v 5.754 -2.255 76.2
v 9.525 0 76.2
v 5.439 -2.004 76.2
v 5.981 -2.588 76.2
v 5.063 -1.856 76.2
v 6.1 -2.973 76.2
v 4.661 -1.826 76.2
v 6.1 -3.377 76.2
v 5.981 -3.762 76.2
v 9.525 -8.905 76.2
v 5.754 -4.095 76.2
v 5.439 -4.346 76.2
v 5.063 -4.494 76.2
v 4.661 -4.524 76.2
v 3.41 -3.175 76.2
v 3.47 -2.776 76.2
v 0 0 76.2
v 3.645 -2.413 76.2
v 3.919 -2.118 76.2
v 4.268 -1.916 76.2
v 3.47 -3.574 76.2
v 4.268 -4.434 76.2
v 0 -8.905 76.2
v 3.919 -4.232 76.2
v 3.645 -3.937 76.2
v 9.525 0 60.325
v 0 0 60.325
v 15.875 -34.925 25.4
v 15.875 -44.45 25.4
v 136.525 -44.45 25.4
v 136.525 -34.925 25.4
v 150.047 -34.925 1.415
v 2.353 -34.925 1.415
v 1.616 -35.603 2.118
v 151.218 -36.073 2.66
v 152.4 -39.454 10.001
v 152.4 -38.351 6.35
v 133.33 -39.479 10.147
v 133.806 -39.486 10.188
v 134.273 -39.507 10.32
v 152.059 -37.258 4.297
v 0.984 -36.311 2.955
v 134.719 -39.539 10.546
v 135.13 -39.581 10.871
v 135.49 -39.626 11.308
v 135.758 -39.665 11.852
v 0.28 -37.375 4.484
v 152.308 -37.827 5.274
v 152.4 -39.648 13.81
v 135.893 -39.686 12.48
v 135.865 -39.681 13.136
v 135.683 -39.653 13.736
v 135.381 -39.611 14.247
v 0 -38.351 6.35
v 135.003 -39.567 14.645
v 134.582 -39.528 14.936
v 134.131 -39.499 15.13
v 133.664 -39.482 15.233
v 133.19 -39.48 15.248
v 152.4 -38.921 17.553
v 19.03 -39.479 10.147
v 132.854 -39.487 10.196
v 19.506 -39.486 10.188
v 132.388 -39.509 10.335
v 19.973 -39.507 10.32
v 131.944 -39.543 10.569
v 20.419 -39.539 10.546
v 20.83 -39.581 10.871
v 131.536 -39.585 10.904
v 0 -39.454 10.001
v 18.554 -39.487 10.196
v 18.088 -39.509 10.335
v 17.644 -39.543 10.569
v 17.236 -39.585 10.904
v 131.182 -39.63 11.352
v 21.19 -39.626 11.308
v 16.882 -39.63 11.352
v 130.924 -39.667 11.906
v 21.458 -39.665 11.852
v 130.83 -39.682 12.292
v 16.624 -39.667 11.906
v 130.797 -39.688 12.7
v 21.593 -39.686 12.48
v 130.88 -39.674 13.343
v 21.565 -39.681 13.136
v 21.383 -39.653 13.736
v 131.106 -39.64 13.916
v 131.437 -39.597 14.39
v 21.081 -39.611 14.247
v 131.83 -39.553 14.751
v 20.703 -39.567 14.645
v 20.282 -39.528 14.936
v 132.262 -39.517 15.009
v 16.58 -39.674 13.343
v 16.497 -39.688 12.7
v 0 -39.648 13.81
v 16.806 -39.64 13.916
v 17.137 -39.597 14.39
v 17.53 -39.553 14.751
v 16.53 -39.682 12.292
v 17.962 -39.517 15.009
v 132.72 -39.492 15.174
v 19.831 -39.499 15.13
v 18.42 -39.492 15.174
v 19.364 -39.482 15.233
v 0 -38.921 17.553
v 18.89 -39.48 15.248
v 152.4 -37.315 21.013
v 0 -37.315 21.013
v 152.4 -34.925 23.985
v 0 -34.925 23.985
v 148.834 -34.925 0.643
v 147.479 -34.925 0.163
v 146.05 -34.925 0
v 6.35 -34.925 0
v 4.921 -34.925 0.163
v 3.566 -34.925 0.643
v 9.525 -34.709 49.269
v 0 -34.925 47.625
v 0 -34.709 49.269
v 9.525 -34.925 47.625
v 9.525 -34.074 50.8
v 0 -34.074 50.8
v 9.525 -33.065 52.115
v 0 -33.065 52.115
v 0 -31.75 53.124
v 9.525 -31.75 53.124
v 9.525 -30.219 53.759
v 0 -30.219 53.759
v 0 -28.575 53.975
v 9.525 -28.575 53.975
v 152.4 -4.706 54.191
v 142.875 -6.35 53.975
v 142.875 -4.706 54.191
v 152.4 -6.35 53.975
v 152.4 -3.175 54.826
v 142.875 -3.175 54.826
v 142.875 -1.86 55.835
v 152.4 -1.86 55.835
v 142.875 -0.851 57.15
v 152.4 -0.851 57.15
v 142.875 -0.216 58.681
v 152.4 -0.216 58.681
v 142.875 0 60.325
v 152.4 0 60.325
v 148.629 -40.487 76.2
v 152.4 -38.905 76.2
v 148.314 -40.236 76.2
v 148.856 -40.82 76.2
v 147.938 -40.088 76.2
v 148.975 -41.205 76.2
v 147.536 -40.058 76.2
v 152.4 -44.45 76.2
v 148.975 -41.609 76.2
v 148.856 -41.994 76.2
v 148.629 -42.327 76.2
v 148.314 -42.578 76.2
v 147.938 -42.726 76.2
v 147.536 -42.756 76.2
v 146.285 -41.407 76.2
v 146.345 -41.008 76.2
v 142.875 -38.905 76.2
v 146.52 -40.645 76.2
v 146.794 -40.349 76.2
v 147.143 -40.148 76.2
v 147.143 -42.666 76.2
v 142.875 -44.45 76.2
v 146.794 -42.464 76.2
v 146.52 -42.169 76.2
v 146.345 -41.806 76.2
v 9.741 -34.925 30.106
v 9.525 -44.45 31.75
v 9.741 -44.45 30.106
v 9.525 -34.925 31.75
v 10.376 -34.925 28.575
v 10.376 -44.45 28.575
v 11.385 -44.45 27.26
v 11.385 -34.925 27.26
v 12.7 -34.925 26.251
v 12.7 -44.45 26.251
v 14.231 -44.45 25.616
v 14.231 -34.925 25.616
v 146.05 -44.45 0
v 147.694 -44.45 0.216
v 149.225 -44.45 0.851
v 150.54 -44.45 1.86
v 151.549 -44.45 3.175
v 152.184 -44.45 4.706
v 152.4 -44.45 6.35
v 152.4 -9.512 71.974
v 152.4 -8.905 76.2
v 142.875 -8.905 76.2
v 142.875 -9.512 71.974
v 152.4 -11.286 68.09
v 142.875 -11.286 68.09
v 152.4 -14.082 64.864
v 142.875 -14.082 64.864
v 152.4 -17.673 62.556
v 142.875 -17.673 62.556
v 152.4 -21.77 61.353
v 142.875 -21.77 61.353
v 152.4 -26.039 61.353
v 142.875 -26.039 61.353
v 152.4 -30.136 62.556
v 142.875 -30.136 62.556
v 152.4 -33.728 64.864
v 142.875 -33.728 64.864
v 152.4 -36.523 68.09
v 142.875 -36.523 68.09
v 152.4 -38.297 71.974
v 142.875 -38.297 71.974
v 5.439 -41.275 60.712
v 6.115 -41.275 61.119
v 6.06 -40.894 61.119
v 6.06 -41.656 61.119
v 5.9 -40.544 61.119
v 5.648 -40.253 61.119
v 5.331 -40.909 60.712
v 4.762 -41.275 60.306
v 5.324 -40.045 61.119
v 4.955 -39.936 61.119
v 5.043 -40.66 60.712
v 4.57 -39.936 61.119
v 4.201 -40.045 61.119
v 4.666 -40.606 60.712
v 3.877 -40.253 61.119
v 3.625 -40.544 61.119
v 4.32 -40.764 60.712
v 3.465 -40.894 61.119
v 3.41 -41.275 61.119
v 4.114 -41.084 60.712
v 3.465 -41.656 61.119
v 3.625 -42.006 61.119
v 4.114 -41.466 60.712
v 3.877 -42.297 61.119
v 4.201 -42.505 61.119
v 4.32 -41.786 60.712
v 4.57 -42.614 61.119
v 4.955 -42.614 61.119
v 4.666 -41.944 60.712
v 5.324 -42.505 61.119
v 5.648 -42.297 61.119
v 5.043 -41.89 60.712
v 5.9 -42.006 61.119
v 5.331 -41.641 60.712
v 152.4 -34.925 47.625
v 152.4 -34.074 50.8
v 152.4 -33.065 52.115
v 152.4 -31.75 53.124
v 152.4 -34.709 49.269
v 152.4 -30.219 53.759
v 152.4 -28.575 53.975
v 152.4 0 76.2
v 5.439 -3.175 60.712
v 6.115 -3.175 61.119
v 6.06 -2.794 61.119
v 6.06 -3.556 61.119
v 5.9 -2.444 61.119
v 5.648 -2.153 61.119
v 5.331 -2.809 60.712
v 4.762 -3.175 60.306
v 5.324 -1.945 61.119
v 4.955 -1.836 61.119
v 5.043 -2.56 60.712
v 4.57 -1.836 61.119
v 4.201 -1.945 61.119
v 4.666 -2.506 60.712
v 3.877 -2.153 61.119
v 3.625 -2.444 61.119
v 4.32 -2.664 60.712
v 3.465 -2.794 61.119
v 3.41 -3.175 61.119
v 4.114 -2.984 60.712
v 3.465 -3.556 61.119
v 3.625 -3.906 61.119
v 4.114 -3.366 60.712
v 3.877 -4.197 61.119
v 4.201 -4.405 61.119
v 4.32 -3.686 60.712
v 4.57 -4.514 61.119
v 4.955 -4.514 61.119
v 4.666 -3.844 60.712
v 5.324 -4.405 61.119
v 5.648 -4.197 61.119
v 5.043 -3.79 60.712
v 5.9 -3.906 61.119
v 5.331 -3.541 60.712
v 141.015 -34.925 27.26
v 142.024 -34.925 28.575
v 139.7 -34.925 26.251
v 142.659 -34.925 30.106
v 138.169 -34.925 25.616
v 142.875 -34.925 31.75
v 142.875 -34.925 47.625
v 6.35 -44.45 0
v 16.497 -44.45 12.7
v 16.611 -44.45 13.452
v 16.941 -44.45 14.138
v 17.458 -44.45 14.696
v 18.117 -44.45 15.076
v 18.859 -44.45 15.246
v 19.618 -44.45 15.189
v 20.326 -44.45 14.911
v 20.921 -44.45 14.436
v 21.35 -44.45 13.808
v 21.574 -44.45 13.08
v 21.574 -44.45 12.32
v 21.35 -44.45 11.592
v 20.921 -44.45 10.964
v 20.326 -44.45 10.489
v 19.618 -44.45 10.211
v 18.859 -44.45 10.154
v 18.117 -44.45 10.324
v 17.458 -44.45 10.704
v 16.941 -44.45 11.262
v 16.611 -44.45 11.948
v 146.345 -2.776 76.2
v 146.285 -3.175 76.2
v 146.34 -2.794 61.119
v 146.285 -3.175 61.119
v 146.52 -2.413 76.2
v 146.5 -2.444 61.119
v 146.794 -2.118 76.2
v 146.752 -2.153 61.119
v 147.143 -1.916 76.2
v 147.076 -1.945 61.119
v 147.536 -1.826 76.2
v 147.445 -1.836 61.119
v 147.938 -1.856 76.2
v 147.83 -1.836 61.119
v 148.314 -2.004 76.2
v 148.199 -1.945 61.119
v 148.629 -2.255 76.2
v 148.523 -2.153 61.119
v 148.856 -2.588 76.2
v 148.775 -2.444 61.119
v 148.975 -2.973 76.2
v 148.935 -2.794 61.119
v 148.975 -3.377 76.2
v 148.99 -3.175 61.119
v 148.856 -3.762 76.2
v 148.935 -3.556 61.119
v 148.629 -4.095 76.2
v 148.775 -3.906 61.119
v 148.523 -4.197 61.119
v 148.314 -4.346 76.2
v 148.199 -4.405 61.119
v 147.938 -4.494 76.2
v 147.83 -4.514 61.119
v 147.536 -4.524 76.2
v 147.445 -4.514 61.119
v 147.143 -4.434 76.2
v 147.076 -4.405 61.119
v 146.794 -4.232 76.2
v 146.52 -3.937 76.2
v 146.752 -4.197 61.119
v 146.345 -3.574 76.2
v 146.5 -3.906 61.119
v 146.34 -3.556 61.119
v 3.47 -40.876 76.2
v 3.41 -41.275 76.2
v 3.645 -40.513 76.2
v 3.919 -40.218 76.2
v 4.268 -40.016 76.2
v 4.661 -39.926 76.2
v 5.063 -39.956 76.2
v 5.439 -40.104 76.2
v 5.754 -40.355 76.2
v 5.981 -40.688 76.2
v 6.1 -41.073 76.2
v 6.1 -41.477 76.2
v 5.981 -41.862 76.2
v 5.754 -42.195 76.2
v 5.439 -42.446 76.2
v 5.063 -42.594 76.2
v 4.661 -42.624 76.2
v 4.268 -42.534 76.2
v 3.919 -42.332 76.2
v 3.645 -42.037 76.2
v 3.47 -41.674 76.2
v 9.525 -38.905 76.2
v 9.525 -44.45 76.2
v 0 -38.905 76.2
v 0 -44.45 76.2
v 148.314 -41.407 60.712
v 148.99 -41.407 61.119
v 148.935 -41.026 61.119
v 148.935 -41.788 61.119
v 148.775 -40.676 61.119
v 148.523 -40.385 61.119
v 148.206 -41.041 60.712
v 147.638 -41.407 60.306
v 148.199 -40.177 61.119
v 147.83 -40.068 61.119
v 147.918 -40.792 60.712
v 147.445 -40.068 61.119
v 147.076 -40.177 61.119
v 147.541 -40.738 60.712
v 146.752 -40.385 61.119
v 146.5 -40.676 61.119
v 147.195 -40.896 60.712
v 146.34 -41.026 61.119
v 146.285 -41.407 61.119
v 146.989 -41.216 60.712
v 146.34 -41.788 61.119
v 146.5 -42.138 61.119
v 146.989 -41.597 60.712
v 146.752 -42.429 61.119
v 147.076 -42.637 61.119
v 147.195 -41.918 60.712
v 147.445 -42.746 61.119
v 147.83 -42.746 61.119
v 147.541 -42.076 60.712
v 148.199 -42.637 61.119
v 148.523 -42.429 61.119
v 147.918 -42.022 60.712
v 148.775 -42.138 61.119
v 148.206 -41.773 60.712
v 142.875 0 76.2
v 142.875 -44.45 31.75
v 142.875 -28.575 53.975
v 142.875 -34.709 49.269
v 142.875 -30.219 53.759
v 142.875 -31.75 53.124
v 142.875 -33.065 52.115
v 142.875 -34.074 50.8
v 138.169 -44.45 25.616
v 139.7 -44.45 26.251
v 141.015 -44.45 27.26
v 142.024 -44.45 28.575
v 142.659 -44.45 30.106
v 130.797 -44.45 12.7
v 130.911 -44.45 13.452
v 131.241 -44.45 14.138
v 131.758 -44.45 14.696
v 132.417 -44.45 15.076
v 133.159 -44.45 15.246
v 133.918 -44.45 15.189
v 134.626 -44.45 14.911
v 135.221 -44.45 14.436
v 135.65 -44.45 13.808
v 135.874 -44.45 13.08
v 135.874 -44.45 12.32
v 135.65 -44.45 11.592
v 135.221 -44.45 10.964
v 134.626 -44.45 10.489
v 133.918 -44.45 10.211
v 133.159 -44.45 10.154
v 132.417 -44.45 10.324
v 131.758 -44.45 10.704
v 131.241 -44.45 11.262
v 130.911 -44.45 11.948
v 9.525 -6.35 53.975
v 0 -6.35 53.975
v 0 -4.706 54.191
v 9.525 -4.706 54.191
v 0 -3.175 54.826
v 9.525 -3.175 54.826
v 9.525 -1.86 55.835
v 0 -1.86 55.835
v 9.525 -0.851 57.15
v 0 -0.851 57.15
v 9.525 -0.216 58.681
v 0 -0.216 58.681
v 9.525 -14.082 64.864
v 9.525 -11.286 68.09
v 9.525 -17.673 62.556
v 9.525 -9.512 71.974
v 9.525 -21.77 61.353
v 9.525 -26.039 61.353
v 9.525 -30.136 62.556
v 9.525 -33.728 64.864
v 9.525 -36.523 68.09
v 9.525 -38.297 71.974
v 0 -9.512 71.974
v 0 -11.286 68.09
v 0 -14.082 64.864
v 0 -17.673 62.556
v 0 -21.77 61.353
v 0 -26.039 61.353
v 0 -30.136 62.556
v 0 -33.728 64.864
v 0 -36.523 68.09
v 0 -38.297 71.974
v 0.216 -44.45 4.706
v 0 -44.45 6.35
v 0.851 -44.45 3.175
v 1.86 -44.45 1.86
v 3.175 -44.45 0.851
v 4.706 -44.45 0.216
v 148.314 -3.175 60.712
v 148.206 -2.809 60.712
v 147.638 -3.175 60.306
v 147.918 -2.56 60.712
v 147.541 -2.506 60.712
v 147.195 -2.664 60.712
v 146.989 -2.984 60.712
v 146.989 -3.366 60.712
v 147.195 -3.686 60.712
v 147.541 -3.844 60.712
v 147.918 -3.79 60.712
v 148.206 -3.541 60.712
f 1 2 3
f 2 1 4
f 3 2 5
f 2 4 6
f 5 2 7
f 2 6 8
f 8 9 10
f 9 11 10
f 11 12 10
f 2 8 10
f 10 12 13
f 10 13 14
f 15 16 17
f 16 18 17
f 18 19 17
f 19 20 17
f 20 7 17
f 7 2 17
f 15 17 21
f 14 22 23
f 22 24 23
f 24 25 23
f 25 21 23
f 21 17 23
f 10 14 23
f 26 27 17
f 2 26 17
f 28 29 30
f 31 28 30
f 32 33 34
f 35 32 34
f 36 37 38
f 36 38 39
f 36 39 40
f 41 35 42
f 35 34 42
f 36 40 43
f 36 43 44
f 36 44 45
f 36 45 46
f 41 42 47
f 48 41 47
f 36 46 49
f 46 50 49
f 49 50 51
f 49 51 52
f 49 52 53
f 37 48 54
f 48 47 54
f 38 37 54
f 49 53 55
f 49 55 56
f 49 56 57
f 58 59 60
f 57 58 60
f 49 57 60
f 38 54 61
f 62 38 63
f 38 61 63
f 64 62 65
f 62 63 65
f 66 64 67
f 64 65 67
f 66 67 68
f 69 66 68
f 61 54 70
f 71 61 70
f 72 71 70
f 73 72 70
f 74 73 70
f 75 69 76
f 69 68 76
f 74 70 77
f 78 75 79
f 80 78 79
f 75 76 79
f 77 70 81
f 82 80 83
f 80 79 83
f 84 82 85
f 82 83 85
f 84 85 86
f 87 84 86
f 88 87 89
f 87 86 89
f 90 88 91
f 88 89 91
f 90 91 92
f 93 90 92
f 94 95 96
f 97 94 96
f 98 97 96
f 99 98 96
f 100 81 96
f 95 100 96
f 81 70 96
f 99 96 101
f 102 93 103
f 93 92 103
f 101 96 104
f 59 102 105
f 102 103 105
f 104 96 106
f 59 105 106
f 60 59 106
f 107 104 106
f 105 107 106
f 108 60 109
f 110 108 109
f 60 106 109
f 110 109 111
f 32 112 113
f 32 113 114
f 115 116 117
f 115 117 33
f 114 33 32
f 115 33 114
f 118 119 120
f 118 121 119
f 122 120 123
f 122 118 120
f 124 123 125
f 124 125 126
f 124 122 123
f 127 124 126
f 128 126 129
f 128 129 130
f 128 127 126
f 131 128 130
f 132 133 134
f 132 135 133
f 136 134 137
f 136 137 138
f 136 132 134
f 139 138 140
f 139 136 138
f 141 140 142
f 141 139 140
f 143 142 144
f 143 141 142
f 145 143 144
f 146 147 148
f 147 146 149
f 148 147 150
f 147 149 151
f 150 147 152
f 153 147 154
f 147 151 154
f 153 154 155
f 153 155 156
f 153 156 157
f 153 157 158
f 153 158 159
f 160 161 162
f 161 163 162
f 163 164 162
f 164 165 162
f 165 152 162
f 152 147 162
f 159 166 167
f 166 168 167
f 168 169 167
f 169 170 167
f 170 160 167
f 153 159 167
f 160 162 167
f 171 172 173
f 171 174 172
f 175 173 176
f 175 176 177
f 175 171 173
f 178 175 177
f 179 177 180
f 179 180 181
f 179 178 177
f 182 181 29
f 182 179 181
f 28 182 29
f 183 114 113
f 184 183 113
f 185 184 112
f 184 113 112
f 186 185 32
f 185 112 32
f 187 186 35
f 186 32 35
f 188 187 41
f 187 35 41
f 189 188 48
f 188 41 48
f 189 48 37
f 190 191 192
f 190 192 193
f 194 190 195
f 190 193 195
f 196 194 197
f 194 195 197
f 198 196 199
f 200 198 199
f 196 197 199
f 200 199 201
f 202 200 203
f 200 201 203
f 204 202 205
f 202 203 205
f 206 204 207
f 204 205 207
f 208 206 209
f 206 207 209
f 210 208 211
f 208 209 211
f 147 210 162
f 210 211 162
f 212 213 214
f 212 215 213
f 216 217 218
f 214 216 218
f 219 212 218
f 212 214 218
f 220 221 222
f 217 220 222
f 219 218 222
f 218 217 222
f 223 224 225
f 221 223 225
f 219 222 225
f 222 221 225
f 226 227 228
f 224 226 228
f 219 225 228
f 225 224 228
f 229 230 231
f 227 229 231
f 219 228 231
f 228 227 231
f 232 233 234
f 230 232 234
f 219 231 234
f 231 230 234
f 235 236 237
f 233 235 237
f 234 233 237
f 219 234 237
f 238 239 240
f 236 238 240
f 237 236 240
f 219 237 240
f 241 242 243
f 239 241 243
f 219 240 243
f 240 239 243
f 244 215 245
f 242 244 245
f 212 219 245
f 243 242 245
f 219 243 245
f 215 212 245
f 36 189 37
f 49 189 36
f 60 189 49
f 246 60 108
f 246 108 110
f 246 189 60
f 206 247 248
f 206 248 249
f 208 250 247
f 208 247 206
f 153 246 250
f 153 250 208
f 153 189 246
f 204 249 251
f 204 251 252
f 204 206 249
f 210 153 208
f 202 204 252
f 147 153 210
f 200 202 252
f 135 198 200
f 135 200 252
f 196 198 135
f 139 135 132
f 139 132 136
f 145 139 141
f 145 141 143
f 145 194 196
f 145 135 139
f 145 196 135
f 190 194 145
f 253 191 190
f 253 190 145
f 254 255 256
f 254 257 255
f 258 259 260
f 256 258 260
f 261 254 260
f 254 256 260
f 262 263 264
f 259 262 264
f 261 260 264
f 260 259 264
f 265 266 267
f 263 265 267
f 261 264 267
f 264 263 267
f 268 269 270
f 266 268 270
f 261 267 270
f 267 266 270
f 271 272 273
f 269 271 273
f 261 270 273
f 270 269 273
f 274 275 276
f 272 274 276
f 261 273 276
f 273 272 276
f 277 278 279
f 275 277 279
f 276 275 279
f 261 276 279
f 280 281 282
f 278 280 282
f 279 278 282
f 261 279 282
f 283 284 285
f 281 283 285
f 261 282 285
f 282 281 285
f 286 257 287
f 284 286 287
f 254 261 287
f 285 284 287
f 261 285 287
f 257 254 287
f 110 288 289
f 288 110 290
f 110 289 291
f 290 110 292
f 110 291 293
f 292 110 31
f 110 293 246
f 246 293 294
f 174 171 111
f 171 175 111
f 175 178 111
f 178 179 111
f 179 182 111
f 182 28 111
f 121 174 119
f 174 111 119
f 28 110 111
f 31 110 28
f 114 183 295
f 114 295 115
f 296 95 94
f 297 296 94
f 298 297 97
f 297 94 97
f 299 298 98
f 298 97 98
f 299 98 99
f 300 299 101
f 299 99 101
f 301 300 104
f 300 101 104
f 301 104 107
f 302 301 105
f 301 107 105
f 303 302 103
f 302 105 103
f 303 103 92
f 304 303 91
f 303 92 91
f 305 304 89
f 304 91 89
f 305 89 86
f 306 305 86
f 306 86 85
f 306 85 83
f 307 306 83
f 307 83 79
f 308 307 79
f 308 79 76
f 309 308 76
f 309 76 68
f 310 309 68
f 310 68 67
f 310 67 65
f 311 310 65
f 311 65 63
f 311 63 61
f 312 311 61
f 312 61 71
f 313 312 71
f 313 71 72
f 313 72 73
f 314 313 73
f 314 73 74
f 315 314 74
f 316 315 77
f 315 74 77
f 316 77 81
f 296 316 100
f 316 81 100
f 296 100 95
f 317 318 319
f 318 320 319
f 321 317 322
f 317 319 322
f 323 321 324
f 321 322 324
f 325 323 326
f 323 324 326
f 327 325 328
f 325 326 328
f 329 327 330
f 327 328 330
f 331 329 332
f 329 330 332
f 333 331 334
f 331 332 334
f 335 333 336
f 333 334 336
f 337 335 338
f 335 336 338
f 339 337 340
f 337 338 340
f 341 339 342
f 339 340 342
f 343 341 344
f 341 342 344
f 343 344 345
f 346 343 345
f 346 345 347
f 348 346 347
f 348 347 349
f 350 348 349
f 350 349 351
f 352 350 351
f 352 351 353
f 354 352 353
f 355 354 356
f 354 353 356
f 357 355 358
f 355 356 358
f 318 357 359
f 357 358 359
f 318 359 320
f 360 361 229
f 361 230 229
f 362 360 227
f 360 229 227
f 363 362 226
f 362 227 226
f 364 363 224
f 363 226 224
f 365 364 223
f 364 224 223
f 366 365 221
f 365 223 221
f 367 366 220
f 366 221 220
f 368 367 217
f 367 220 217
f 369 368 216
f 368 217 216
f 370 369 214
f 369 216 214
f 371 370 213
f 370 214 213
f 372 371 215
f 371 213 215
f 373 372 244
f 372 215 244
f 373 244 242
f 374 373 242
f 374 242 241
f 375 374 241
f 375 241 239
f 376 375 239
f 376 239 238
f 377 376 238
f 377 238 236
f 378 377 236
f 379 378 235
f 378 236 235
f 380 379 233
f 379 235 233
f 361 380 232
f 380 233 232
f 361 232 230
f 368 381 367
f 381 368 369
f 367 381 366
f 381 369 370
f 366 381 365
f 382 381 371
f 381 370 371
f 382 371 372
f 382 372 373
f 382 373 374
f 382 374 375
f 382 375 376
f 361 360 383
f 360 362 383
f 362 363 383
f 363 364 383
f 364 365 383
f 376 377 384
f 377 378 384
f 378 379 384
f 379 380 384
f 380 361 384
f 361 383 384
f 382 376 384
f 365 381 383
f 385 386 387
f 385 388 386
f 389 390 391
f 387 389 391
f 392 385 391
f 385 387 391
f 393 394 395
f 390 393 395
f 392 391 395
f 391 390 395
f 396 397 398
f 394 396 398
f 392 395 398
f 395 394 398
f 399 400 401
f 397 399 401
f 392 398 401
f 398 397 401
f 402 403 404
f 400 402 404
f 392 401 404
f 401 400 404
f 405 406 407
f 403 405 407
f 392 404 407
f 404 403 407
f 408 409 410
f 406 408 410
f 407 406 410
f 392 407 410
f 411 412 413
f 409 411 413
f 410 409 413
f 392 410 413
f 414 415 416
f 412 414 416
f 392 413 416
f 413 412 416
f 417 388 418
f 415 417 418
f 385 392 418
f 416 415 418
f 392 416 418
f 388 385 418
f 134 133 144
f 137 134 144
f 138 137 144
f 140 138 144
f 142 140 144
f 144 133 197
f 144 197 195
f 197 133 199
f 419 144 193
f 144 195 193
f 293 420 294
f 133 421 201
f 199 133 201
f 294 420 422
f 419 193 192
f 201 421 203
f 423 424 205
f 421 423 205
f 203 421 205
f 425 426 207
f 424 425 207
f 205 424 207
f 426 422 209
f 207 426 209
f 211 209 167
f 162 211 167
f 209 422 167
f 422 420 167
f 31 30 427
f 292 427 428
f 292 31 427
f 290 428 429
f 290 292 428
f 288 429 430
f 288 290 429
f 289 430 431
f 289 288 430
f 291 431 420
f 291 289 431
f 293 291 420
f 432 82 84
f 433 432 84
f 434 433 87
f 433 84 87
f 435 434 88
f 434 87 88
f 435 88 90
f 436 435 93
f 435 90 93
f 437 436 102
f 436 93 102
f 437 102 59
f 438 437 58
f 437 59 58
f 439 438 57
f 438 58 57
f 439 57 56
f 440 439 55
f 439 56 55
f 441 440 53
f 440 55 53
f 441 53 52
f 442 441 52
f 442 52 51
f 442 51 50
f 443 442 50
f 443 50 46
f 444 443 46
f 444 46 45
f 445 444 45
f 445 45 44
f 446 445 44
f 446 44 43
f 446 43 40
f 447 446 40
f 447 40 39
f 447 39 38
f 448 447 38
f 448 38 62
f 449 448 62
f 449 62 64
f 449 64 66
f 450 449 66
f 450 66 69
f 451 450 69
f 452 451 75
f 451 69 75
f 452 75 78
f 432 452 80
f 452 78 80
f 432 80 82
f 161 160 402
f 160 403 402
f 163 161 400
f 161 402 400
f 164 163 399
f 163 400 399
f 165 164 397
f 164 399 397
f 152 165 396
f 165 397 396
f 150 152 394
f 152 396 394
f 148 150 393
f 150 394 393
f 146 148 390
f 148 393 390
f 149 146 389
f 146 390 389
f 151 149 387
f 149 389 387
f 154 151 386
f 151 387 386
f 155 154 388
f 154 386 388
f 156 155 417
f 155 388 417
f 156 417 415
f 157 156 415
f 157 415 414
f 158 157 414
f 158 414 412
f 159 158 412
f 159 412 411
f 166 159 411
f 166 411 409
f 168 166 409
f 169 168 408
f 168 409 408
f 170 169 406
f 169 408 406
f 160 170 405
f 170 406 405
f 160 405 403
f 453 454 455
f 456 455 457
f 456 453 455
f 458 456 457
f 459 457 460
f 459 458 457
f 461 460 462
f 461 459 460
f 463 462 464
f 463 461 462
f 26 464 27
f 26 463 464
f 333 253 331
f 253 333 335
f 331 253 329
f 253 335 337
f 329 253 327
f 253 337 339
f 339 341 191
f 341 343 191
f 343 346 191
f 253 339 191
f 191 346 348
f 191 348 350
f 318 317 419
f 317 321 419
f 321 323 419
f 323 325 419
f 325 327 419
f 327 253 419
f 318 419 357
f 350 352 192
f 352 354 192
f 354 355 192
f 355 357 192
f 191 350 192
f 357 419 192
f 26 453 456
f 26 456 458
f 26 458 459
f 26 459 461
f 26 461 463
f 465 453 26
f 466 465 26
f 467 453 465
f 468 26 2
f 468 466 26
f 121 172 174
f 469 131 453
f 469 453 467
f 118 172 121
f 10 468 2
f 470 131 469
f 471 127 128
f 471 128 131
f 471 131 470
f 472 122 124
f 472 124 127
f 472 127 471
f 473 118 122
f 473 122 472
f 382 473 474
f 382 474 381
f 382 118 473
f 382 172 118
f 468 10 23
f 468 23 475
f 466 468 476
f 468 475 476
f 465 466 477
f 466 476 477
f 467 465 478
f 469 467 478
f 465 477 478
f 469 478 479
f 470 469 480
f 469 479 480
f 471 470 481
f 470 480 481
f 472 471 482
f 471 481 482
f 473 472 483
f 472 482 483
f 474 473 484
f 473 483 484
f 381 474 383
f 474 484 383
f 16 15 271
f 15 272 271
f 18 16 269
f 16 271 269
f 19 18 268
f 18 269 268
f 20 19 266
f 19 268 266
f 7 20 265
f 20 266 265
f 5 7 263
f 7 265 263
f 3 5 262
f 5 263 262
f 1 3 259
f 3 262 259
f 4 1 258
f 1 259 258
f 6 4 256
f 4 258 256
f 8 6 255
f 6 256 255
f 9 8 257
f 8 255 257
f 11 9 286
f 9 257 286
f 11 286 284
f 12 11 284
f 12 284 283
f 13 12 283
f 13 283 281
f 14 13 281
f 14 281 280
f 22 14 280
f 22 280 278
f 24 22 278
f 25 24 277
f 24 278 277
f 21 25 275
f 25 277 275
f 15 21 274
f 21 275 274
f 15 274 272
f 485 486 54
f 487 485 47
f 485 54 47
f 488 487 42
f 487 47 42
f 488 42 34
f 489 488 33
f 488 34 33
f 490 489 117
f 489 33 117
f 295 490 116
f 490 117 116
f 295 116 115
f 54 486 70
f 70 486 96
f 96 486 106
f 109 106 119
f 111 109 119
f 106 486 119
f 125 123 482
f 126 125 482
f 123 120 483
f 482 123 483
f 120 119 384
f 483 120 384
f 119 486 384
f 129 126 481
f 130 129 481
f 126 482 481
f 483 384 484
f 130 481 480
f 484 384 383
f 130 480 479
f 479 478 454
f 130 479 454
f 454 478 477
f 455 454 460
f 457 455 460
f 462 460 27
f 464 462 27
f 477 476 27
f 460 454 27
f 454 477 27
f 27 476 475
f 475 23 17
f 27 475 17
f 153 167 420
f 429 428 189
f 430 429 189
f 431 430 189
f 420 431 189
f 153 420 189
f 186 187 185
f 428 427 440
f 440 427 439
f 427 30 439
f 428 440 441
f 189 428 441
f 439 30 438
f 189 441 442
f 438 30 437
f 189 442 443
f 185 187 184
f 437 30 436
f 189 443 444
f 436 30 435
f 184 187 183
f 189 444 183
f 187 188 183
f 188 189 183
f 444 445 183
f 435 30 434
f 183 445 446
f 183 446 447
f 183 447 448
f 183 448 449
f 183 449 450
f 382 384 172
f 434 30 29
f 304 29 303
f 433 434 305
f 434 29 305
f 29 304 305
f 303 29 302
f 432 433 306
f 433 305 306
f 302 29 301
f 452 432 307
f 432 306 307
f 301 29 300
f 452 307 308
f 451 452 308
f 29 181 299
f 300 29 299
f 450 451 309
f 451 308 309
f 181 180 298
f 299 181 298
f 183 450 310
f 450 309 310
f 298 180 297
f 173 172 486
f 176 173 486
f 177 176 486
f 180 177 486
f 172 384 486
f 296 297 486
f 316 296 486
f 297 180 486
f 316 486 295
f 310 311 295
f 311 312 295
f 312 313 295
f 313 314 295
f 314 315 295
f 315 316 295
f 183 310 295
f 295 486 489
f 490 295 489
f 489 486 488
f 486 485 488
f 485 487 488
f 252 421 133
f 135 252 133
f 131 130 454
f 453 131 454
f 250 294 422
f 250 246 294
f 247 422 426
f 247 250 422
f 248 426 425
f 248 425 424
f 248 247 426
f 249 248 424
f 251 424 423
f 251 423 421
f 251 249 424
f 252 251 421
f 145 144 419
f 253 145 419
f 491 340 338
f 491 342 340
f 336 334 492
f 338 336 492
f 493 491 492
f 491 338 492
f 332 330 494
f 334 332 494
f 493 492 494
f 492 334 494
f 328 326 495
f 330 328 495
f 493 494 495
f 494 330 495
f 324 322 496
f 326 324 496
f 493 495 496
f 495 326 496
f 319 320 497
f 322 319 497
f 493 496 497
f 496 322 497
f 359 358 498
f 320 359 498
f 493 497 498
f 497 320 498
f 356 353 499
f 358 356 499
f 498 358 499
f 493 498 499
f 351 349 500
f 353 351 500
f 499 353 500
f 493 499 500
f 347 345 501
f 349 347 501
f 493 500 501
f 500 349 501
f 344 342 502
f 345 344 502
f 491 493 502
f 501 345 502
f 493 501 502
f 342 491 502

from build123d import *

# Parameters (mm, degrees)
F1_DEPTH = 152.4
F2_W     = 133.35
F2_H     = 50.8
F3_DEPTH = 44.451
F4_R     = 6.35
F6_D     = 5.1054
F8_D     = 2.7051
F8_DEPTH = 15.08125
F8_TIP   = 0.8126940303


with BuildPart() as f1:
    # F0 (on Right) → F1 (new body)
    with BuildSketch(Plane.YZ):
        with BuildLine():
            ThreePointArc((-8.9046512, 76.2), (-23.9046512, 61.2), (-38.9046512, 76.2))
            Line((-38.9046512, 76.2), (-44.45, 76.2))
            Line((-44.45, 76.2), (-44.45, 0))
            Line((-44.45, 0), (-34.925, 0))
            Line((-34.925, 0), (-34.925, 1.4153871466))
            ThreePointArc((-34.925, 1.4153871466), (-39.6875, 12.7), (-34.925, 23.9846128534))
            Line((-34.925, 23.9846128534), (-34.925, 53.975))
            Line((-34.925, 53.975), (0, 53.975))
            Line((0, 53.975), (0, 76.2))
            Line((0, 76.2), (-8.9046512, 76.2))
        make_face()
    extrude(amount=F1_DEPTH)

    # F2 (on face) → F3 (cut, through all)
    with BuildSketch(Plane.XZ.offset(44.45)):
        with Locations((76.2, 50.8)):
            Rectangle(F2_W, F2_H)
    extrude(amount=-F3_DEPTH, mode=Mode.SUBTRACT)

    # F4
    f4_edges = [f1.edges().sort_by_distance(p)[0] for p in [
        (147.6375, 0, 53.975),
        (4.7625, 0, 53.975),
        (4.7625, -34.925, 53.975),
        (147.6375, -34.925, 53.975),
        (152.4, -39.6875, 0),
        (0, -39.6875, 0),
        (142.875, -39.6875, 25.4),
        (9.525, -39.6875, 25.4),
    ]]
    fillet(f4_edges, radius=F4_R)

    # F6 (through all)
    with Locations(Plane.XZ.offset(44.45)):
        with Locations((19.05, 12.7), (133.35, 12.7)):
            Hole(F6_D / 2)

    # F8
    with Locations(Plane.XY.offset(76.2)):
        with Locations((4.7625, -3.175), (4.7625, -41.275), (147.6375, -3.175), (147.6375, -41.4069328651)):
            Hole(F8_D / 2, depth=F8_DEPTH)
            with Locations((0, 0, -(F8_DEPTH + F8_TIP / 2))):  # 118° drill point
                Cone(0, F8_D / 2, F8_TIP, mode=Mode.SUBTRACT)


solid = f1.part
